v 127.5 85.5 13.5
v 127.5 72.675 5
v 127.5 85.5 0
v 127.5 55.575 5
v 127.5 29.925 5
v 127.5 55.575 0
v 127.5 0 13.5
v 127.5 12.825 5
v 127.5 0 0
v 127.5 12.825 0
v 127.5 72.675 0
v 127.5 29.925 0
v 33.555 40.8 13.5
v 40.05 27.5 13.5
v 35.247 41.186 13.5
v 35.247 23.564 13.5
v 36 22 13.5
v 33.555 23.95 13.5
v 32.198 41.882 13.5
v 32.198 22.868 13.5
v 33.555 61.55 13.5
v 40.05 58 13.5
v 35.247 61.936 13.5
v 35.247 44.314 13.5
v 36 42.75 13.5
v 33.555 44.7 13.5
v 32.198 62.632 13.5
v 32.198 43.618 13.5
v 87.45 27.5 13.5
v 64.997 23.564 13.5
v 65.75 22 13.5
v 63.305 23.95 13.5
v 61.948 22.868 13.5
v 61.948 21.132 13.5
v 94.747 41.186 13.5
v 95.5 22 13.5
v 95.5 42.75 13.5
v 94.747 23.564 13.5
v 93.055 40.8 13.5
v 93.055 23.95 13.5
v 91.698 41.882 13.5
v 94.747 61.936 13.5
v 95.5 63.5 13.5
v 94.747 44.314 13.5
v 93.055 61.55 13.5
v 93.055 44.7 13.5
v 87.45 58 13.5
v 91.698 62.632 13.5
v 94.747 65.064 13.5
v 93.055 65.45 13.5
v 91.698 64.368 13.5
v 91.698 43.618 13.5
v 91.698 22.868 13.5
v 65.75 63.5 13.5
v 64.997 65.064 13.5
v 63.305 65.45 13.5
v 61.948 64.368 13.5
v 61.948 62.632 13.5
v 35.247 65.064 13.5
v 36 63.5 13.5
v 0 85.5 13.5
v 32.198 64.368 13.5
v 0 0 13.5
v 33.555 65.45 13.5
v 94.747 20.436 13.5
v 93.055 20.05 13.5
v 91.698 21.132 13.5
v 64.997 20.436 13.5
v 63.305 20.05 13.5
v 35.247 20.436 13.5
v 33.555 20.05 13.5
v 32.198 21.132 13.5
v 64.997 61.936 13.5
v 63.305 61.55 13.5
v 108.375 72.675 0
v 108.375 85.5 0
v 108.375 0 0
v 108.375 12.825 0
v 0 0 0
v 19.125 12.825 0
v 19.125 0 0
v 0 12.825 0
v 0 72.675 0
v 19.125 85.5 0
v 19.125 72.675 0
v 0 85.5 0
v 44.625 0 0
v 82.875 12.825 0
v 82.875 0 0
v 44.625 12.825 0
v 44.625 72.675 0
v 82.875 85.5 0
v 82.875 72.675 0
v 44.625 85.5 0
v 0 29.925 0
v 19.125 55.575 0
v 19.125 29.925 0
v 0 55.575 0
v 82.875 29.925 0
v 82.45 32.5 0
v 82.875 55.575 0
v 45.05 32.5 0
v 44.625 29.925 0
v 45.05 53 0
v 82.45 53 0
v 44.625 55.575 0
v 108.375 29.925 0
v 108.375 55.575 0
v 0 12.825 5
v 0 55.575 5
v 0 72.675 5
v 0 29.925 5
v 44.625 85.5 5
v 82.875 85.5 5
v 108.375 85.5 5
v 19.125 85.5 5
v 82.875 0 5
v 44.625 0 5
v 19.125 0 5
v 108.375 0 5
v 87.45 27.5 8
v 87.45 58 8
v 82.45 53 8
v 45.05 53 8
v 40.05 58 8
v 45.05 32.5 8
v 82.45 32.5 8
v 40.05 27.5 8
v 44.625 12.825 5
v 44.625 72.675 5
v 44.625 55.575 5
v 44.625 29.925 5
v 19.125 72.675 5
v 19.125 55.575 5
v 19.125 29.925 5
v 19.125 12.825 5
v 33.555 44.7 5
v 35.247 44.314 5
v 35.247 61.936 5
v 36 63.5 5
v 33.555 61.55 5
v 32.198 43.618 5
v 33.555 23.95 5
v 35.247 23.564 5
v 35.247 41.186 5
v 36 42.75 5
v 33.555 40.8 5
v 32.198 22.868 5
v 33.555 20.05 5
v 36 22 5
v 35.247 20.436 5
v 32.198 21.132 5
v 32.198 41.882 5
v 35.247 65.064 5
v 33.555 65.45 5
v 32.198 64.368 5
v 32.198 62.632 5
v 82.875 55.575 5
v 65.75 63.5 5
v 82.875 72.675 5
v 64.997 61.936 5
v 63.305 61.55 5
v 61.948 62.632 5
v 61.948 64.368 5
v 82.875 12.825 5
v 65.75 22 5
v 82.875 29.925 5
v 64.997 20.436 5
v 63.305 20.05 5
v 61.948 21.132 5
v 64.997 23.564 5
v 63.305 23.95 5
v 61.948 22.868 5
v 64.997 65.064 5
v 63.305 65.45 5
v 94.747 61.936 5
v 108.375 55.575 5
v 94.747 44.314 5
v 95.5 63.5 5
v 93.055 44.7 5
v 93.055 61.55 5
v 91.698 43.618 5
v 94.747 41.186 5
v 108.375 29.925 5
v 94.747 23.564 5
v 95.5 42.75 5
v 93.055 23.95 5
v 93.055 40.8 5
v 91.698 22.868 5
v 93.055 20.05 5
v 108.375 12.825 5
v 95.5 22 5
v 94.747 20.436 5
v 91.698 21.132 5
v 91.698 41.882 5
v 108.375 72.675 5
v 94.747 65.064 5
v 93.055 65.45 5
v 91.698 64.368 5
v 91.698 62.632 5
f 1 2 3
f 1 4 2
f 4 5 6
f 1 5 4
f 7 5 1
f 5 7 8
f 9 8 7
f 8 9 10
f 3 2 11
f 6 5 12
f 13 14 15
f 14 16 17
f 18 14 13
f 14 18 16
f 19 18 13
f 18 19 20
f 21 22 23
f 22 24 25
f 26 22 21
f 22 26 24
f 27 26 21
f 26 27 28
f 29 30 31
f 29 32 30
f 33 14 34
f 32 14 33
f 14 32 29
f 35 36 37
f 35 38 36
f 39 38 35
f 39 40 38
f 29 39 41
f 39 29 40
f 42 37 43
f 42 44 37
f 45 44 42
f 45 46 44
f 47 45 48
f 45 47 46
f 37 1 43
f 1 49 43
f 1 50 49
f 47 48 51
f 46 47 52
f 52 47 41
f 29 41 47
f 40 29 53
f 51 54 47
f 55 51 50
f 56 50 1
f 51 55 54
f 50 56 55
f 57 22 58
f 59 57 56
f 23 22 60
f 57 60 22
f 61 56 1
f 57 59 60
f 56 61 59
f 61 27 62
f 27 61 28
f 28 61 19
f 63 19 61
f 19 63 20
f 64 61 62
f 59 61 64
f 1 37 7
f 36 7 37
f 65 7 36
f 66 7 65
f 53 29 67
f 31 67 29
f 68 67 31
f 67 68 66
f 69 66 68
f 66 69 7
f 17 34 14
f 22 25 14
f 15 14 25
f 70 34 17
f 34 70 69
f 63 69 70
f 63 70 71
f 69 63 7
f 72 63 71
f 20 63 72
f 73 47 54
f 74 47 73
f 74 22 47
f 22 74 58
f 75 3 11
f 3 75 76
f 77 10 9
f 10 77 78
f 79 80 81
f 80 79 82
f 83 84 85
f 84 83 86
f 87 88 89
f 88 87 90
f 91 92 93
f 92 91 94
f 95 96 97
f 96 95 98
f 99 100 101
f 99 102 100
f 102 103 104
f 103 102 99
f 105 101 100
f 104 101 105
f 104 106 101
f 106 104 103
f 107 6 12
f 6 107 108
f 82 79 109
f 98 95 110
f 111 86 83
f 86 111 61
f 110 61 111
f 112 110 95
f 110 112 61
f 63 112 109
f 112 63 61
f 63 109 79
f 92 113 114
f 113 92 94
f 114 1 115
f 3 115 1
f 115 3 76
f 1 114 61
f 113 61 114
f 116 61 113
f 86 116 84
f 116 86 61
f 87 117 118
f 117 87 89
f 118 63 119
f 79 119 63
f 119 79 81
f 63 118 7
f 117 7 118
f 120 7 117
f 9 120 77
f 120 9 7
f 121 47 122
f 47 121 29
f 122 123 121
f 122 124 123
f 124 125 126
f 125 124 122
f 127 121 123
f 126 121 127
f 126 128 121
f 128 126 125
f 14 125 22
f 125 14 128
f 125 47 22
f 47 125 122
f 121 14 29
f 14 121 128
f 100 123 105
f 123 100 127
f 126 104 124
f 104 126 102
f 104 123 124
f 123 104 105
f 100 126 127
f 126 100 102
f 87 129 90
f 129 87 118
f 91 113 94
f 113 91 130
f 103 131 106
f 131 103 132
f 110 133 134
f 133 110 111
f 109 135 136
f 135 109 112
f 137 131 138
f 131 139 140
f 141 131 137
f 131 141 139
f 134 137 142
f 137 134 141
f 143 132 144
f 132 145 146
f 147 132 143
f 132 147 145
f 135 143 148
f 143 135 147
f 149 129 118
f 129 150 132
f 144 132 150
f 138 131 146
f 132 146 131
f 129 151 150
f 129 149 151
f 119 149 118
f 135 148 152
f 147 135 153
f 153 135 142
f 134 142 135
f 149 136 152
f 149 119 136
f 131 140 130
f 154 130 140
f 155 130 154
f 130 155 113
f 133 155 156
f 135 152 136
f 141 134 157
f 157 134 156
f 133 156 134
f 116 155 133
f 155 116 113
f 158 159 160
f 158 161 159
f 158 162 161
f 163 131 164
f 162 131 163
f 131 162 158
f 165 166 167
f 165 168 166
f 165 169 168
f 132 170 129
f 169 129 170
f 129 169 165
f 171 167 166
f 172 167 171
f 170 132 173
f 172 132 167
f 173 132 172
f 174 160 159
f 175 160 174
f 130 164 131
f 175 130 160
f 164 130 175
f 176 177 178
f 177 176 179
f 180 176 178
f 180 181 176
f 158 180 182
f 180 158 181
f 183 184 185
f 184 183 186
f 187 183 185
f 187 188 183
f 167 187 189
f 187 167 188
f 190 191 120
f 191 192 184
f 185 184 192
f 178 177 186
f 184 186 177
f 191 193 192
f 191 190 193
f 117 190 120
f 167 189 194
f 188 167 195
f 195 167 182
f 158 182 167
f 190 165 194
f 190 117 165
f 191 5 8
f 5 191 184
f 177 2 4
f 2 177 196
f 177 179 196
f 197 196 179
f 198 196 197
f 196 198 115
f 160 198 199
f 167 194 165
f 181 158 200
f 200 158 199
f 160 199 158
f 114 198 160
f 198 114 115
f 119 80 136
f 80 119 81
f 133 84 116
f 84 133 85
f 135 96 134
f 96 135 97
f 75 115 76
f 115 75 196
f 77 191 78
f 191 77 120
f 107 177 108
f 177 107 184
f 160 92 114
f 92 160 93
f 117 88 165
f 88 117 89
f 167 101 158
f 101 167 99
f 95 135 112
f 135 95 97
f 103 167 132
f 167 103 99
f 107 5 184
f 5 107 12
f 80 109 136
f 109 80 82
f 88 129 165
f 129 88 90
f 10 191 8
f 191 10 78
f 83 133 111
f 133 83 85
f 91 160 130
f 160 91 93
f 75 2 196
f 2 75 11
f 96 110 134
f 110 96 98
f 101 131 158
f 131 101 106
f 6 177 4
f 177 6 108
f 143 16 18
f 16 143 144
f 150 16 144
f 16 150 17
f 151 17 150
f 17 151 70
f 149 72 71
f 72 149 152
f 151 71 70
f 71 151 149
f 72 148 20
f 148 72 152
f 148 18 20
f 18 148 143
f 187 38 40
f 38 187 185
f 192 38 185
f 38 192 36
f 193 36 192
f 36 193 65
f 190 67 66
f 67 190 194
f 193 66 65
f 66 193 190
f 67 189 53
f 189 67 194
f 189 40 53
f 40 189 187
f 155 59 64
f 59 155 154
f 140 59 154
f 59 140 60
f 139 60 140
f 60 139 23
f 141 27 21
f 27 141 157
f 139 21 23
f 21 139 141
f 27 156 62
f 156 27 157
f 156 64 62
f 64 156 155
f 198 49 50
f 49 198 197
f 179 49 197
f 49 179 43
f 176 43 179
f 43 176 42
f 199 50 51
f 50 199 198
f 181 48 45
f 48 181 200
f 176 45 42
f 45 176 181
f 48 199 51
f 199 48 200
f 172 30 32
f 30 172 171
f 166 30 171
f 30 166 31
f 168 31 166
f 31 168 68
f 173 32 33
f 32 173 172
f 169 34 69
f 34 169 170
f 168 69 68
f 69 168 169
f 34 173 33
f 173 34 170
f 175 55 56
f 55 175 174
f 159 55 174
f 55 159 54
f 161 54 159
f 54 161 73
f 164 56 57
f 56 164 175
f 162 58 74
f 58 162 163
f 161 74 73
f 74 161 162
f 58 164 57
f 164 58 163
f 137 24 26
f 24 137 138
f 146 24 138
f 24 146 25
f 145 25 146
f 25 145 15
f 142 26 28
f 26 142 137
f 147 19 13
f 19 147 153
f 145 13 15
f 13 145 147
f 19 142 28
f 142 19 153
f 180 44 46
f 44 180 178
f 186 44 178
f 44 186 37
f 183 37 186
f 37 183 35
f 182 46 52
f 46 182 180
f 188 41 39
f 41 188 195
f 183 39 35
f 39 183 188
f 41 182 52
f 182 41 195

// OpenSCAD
uF_w = 47.4;
uF_l = 30.5;
uF_h = 5.5;
holder_edge_from_uF_edge = 15;     // Must be > 15
holder_overhang_into_uF_edge = 5;



h = 8;
l = 85.5;
w = 127.5;
screw_hole_r = 4/2;
screw_from_edge = 22;


difference() {
cube([w, l, h+uF_h]);       // hight to account for uF support edge
    
   // uF Support Edge
   translate([w/2, l/2, h+uF_h])    
    cube([uF_w, uF_l, 2*uF_h], center = true);   
    
   // uF Hole
   translate([w/2, l/2, (h+uF_h)/2]) 
    cube([uF_w-holder_overhang_into_uF_edge*2, uF_l-holder_overhang_into_uF_edge*2, 100], center = true);
    
   // Holes for valves to escape
        // the +1 is for clerance
        // /5 is arbitrary
   translate([w/4, l/2, 0]) 
    cube([w/5,l+1,5*2], center = true); 
    
   translate([3*w/4, l/2, 0]) 
    cube([w/5,l+1,5*2], center = true); 
   
   translate([w/2, l/4, 0]) 
    cube([w+1,l/5,5*2], center = true);
    
   translate([w/2, 3*l/4, 0]) 
    cube([w+1,l/5,5*2], center = true);
    
        // Bottom Left hole
       translate([screw_from_edge+12, screw_from_edge, 0]) 
    cylinder(h = 50, r = screw_hole_r);
        
       // Bottom Right hole
       translate([w-screw_from_edge-12, screw_from_edge, 0]) 
    cylinder(h = 50, r = screw_hole_r);
        
       // Top Left hole
       translate([screw_from_edge+12, l-screw_from_edge, 0]) 
    cylinder(h = 50, r = screw_hole_r);
        
       // Top Right hole
       translate([w-screw_from_edge-12, l-screw_from_edge, 0]) 
    cylinder(h = 50, r = screw_hole_r);
        
       // Bottom Middle hole
       translate([w/2, screw_from_edge, 0]) 
    cylinder(h = 50, r = screw_hole_r);

       // Top Middle hole
       translate([w/2, l-screw_from_edge, 0]) 
    cylinder(h = 50, r = screw_hole_r);
        
       // Left Middle hole
       translate([screw_from_edge+12, l/2, 0]) 
    cylinder(h = 50, r = screw_hole_r);

       // Right Middle hole
       translate([w-screw_from_edge-12, l/2, 0]) 
    cylinder(h = 50, r = screw_hole_r);
    }
